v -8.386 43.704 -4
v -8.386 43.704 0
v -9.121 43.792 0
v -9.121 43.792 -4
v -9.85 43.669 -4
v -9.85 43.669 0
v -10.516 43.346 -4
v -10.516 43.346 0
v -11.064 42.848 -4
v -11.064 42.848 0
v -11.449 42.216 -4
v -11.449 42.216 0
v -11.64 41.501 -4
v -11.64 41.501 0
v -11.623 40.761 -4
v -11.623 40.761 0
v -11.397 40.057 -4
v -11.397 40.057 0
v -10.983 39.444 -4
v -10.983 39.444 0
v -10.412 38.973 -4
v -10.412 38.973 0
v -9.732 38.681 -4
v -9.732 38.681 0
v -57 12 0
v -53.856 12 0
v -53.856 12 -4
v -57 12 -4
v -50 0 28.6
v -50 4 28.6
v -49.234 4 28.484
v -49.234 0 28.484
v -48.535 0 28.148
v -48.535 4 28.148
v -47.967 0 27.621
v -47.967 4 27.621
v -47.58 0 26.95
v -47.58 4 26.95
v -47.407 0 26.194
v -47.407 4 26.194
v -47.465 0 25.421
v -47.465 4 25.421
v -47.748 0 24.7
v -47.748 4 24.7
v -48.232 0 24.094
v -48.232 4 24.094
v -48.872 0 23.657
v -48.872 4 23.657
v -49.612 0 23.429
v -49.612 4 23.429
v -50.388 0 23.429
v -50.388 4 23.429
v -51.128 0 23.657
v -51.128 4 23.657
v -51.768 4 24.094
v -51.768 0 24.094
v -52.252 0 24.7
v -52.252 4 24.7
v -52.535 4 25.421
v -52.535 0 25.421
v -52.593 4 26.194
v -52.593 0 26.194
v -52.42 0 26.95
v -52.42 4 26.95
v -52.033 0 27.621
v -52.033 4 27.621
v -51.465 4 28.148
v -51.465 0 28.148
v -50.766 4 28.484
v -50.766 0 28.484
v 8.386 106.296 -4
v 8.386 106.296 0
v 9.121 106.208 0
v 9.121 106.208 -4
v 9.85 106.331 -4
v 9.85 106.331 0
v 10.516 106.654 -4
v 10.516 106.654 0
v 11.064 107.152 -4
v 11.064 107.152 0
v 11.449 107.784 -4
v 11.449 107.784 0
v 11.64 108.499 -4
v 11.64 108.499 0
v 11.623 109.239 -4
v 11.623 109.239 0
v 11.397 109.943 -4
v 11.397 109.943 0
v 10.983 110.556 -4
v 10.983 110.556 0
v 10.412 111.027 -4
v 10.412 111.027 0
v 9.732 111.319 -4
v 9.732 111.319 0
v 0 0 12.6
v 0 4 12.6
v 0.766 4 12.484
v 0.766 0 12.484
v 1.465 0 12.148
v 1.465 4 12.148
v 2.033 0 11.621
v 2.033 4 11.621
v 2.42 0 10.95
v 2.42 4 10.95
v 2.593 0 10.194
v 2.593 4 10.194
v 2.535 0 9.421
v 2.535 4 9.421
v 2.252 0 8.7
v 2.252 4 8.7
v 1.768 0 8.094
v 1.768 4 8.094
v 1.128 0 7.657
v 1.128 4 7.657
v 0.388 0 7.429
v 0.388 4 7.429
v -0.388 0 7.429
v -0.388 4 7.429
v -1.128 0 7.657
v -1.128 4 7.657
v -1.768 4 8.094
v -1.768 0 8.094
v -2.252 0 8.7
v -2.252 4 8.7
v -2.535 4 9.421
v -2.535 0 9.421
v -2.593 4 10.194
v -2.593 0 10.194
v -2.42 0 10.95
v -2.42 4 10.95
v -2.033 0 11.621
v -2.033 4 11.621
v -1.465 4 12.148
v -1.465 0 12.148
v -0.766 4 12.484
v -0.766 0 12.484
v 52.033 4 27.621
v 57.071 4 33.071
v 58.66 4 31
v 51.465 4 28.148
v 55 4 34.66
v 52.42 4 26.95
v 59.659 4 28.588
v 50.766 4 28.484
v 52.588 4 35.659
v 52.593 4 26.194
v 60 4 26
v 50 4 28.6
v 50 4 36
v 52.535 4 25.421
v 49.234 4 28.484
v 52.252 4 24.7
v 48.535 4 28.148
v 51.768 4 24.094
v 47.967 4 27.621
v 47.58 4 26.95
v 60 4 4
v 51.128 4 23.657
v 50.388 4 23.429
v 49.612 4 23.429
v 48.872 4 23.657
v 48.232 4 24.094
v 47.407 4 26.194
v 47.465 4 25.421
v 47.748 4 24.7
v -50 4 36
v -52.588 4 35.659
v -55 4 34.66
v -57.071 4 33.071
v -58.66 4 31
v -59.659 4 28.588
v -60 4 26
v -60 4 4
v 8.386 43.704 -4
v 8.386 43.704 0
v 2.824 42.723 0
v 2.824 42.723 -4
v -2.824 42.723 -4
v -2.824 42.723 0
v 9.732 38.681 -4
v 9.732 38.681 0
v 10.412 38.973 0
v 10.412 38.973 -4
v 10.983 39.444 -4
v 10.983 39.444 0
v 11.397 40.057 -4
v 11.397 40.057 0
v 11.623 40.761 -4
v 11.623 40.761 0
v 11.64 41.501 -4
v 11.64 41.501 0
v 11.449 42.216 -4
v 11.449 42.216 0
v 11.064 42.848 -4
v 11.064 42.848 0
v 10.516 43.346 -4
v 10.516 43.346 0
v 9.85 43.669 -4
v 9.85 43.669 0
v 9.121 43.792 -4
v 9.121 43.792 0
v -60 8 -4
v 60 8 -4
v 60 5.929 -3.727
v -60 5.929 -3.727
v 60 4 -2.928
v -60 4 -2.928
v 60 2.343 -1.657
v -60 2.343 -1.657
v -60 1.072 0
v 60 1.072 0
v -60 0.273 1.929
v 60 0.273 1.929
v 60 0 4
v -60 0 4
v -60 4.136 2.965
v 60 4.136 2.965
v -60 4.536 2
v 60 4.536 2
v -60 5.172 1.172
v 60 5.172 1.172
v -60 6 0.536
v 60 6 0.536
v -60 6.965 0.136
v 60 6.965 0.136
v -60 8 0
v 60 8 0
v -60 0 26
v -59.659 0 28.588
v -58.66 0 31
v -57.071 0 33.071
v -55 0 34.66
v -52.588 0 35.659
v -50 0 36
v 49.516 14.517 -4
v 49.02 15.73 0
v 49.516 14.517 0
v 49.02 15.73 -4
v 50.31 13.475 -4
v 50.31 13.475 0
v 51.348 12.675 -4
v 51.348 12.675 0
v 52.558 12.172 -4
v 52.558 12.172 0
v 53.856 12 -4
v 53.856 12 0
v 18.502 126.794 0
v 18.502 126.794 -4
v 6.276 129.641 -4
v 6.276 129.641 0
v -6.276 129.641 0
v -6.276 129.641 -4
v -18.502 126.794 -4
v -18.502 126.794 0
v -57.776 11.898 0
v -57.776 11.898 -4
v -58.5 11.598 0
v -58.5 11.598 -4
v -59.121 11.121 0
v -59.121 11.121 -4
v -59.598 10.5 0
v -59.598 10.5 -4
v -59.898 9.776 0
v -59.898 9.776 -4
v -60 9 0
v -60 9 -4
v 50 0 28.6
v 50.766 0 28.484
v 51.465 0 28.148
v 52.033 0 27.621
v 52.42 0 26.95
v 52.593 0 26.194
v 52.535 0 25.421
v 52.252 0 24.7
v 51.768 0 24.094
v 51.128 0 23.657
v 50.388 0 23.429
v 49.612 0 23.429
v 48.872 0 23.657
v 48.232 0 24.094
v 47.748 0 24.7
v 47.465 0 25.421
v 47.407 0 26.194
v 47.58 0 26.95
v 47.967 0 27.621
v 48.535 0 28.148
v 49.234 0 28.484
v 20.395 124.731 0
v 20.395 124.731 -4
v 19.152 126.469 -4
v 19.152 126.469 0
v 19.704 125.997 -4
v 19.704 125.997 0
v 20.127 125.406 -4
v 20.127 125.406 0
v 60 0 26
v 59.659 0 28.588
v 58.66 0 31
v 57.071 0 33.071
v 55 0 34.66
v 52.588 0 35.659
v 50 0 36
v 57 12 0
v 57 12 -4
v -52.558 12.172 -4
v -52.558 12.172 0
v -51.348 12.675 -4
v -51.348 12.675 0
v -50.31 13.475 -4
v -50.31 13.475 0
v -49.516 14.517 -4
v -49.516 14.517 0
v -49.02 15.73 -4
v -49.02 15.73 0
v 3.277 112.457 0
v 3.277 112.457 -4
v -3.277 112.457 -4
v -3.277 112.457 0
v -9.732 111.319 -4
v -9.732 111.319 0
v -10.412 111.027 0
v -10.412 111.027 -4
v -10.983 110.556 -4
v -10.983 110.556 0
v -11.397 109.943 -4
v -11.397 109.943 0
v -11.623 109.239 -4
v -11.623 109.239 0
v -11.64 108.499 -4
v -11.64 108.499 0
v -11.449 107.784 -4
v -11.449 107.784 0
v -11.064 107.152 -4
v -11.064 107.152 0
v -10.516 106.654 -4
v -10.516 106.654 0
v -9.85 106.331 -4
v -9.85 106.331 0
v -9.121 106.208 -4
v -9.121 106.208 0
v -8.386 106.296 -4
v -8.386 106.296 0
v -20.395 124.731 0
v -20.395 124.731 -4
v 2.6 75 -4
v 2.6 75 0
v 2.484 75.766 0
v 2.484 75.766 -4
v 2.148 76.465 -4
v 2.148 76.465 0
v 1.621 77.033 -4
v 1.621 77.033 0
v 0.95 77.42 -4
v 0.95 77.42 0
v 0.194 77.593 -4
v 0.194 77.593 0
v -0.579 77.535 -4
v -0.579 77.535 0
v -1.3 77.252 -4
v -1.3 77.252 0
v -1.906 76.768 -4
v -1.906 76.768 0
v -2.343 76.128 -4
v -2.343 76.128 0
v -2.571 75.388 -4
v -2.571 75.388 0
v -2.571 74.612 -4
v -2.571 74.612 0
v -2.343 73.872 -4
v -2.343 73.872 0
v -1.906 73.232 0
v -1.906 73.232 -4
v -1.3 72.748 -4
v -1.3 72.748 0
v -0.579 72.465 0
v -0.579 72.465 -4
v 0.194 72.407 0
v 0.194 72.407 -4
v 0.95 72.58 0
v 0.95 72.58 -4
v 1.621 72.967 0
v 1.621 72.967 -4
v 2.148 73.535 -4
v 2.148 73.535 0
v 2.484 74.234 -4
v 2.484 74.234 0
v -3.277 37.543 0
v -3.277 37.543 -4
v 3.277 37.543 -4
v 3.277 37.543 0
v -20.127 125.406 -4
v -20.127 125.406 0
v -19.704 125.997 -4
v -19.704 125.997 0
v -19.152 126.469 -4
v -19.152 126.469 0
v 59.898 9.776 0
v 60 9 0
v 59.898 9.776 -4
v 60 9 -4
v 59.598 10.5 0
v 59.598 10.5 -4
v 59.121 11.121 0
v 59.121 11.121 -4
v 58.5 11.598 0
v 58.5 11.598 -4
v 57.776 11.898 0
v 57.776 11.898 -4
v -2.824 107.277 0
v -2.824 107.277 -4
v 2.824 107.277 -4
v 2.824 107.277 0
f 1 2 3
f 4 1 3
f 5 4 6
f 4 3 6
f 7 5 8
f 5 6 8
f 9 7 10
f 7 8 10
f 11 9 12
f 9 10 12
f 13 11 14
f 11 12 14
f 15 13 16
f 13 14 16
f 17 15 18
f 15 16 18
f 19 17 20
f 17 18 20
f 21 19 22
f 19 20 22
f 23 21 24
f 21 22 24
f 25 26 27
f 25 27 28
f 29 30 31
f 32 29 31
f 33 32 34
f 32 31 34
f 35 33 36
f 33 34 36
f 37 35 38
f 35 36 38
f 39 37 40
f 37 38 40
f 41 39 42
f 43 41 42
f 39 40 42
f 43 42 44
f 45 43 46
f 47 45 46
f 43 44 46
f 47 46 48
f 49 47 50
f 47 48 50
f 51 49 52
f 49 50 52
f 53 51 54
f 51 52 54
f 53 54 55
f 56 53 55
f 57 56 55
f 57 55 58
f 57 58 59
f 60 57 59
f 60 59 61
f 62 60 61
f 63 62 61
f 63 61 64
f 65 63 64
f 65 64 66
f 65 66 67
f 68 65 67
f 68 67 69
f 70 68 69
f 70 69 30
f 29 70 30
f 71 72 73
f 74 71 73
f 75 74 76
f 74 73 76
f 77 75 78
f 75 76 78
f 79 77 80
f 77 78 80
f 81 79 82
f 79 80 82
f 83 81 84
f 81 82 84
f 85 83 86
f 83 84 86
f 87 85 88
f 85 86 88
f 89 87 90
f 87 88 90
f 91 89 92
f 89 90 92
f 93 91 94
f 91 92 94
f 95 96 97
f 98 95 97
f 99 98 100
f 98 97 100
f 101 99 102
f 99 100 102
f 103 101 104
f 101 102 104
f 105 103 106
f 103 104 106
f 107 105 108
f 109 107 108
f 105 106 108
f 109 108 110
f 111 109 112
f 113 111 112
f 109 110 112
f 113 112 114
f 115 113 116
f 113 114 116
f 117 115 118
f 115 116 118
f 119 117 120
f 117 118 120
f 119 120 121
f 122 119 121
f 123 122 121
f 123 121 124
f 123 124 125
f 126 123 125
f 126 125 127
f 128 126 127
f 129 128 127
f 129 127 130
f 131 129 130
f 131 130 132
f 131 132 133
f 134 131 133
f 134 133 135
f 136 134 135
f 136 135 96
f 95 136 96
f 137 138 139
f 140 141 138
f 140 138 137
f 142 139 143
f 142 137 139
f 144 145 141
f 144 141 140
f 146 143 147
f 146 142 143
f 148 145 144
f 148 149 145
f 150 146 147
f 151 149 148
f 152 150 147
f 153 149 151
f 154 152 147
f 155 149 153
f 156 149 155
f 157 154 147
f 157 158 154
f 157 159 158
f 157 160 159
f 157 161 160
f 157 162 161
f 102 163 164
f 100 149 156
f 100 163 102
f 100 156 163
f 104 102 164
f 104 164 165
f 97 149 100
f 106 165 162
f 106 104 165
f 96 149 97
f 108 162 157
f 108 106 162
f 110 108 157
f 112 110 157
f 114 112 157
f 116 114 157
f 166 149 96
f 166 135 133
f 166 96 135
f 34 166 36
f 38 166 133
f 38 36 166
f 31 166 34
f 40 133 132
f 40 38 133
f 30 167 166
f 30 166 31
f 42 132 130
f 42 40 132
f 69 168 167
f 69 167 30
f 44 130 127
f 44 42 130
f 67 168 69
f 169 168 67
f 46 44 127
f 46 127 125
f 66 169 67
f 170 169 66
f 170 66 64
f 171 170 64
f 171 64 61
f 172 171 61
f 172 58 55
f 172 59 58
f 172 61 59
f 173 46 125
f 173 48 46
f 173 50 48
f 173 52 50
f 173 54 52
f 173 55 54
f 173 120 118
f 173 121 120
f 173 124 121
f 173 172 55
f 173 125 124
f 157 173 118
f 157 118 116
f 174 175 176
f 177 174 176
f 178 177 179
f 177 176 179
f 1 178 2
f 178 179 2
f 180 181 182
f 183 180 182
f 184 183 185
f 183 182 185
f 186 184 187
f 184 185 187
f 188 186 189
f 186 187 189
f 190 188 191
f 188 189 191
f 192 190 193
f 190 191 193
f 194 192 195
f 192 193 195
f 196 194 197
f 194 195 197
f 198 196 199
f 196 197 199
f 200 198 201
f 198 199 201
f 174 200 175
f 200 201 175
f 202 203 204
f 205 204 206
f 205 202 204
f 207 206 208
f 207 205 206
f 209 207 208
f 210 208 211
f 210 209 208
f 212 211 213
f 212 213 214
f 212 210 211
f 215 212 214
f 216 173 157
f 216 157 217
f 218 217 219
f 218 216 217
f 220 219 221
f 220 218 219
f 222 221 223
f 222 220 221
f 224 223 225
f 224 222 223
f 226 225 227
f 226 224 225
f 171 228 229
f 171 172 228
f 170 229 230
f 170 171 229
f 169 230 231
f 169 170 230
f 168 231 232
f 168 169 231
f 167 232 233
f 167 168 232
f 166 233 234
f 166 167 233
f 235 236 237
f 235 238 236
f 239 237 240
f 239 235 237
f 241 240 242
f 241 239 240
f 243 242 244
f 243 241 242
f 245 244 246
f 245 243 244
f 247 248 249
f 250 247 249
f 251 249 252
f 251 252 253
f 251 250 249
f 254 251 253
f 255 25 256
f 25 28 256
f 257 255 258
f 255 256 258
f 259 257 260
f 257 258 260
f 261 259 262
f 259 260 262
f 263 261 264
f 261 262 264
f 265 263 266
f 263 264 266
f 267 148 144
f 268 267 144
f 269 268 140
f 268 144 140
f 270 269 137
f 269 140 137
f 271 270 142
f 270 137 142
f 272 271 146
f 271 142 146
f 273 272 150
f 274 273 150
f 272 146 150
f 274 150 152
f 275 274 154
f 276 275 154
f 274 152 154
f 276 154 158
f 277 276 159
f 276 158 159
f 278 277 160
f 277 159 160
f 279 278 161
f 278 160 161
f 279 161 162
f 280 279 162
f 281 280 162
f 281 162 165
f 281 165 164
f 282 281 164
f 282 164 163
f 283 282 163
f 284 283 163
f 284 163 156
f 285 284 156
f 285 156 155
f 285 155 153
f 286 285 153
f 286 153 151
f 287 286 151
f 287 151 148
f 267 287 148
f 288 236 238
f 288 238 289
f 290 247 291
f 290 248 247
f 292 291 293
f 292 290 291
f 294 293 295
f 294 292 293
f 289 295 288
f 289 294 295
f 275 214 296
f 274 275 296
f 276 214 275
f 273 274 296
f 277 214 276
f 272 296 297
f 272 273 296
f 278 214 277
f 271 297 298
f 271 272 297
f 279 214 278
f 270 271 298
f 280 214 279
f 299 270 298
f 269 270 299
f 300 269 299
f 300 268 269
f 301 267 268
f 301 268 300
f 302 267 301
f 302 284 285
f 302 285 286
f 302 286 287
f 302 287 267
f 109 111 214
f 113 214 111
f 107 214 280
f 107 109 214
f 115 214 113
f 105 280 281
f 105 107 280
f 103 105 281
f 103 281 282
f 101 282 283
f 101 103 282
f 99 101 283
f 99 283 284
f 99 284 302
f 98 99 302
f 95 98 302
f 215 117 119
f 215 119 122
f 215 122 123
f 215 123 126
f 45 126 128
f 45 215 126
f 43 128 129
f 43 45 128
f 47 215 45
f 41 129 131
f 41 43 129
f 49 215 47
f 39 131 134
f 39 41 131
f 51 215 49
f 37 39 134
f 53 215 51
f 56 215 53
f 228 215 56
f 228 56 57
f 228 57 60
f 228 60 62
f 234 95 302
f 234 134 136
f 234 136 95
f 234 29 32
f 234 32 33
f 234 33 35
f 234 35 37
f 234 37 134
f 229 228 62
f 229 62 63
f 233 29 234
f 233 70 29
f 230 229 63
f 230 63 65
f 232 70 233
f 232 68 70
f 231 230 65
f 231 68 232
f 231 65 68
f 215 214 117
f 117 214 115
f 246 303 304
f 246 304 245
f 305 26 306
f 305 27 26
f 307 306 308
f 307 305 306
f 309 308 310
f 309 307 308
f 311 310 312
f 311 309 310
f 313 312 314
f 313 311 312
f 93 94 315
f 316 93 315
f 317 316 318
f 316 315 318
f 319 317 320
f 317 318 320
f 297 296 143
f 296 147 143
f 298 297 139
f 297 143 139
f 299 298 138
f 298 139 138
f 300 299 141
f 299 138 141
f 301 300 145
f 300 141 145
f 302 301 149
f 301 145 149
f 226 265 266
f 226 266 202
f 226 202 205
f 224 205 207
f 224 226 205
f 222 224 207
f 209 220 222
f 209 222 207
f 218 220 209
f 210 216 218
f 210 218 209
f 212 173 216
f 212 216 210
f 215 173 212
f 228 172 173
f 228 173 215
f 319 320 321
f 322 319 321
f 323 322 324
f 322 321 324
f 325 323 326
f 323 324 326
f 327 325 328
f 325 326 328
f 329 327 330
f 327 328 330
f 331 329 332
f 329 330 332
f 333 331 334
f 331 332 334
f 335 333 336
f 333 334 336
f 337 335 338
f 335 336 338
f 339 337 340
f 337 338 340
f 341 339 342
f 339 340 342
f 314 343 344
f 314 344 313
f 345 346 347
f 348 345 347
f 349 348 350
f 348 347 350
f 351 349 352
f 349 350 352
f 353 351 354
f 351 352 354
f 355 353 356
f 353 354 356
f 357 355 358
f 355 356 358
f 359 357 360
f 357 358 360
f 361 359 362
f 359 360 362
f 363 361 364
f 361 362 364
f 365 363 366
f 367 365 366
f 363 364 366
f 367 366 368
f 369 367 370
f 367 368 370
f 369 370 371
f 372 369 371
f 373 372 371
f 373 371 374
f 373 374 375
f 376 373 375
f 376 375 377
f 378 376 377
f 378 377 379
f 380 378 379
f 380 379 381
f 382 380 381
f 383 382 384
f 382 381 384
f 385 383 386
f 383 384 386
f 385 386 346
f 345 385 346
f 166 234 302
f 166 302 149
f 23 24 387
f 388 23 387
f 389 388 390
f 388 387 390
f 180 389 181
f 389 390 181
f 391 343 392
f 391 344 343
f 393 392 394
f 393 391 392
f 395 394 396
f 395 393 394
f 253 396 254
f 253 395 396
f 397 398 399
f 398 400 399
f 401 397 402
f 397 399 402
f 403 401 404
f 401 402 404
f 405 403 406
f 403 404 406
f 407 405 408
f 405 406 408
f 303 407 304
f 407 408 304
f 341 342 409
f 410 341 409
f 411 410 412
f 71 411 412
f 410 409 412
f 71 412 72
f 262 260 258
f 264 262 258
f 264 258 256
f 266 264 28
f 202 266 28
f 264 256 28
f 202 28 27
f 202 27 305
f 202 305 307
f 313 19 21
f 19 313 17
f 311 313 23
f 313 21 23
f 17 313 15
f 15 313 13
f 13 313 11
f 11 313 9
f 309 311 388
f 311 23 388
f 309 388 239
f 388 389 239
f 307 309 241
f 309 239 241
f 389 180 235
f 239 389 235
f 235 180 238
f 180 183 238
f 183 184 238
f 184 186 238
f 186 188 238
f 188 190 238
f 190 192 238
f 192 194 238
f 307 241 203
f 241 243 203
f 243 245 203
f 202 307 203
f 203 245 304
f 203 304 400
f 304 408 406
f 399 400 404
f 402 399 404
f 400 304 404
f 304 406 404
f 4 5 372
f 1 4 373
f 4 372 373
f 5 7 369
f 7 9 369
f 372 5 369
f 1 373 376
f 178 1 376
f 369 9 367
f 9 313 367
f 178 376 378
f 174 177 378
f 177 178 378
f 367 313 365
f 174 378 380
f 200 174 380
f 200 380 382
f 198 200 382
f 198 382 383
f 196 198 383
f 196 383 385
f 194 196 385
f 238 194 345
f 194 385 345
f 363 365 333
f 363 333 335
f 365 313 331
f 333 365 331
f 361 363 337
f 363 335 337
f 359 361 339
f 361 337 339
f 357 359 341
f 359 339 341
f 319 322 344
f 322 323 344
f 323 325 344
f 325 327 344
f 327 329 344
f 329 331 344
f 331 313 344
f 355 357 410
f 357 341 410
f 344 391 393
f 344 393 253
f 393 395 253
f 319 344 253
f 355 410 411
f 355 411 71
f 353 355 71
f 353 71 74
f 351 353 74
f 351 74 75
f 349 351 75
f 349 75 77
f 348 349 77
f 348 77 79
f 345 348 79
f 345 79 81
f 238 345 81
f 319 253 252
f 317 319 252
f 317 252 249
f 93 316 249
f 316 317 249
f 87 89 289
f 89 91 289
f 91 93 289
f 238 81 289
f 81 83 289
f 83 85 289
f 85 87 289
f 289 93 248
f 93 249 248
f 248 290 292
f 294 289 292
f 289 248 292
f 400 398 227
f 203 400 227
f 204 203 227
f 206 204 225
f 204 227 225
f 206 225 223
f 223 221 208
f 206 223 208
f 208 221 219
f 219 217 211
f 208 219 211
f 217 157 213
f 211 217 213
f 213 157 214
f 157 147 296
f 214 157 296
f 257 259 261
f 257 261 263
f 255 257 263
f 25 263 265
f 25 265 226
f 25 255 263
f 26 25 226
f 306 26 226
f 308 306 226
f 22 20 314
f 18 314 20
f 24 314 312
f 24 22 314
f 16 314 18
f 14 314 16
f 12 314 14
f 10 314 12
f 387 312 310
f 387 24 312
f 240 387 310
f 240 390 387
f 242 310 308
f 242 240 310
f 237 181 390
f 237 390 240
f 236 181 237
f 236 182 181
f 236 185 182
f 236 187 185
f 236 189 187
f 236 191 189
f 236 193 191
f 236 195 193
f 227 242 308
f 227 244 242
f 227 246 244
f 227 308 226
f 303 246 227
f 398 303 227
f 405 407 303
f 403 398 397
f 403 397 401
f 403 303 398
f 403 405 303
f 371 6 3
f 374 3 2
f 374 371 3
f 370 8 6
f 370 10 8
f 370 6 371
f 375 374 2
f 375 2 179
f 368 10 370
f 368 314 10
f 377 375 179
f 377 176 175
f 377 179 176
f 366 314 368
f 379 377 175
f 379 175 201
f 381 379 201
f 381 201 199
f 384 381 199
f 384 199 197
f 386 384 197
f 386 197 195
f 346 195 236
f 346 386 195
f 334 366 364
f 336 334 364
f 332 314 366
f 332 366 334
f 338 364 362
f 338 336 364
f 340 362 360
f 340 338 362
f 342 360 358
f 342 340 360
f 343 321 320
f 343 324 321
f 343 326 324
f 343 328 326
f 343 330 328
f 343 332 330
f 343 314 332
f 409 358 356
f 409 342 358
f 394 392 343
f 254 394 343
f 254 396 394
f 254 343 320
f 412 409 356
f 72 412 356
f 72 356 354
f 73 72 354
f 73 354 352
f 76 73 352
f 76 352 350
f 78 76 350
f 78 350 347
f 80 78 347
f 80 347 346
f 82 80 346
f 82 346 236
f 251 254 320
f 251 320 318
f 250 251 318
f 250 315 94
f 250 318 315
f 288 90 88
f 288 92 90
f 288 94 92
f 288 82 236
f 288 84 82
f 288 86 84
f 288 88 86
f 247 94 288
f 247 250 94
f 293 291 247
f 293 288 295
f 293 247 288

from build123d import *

# Parameters (mm, degrees)
SKETCH_13_R                      = 2.6
SM_BASE_FLANGE_2_DEPTH           = 4
SM_EDGE_FLANGE_2_STRIP_W         = 24
SM_EDGE_FLANGE_2_STRIP_H         = 4
SM_EDGE_FLANGE_2_STRIP_CUT_DEPTH = 120
SM_EDGE_FLANGE_2_DEPTH           = 120
FILLET_1_R                       = 5
FILLET_2_R                       = 3
FILLET_3_R                       = 10
SKETCH_23_R                      = 2.6
CUT_EXTRUDE_2_DEPTH              = 10


# Sheet-metal steps are written as plain solids
with BuildPart() as part:
    # Эскиз13 → Базовая кромка2 (new body)
    with BuildSketch(Plane.XY):
        with BuildLine():
            Line((-60, 0), (60, 0))
            Line((60, 0), (60, 12))
            Line((60, 12), (50, 12))
            Line((50, 12), (20, 126.23475383))
            ThreePointArc((20, 126.23475383), (0, 130), (-20, 126.23475383))
            Line((-20, 126.23475383), (-50, 12))
            Line((-50, 12), (-60, 12))
            Line((-60, 12), (-60, 0))
        make_face()
        with Locations((0, 75)):
            Circle(SKETCH_13_R, mode=Mode.SUBTRACT)
        with BuildLine():
            ThreePointArc((9.731596096, 111.318811068), (0, 112.6), (-9.731596096, 111.318811068))
            ThreePointArc((-9.731596096, 111.318811068), (-11.570073727, 108.134474403), (-8.385737061, 106.295996772))
            ThreePointArc((-8.385737061, 106.295996772), (0, 107.4), (8.385737061, 106.295996772))
            ThreePointArc((8.385737061, 106.295996772), (11.570073727, 108.134474403), (9.731596096, 111.318811068))
        make_face(mode=Mode.SUBTRACT)
        with BuildLine():
            ThreePointArc((-9.731596096, 38.681188932), (0, 37.4), (9.731596096, 38.681188932))
            ThreePointArc((9.731596096, 38.681188932), (11.570073727, 41.865525597), (8.385737061, 43.704003228))
            ThreePointArc((8.385737061, 43.704003228), (0, 42.6), (-8.385737061, 43.704003228))
            ThreePointArc((-8.385737061, 43.704003228), (-11.570073727, 41.865525597), (-9.731596096, 38.681188932))
        make_face(mode=Mode.SUBTRACT)
    extrude(amount=-SM_BASE_FLANGE_2_DEPTH)

    # Ребро-кромка2 strip (across the edge) → Ребро-кромка2 strip cut (cut)
    with BuildSketch(Plane.YZ.offset(-60)):
        with Locations((-4, -2)):
            Rectangle(SM_EDGE_FLANGE_2_STRIP_W, SM_EDGE_FLANGE_2_STRIP_H)
    extrude(amount=SM_EDGE_FLANGE_2_STRIP_CUT_DEPTH, mode=Mode.SUBTRACT)

    # Ребро-кромка2 section (across the edge) → Ребро-кромка2 (add)
    with BuildSketch(Plane.YZ.offset(-60)):
        with BuildLine():
            Line((0, 4), (0, 36))
            Line((0, 36), (4, 36))
            Line((4, 36), (4, 4))
            ThreePointArc((4, 4), (5.171572875, 1.171572875), (8, 0))
            Line((8, 0), (8, -4))
            ThreePointArc((8, -4), (2.343145751, -1.656854249), (0, 4))
        make_face()
    extrude(amount=SM_EDGE_FLANGE_2_DEPTH)

    # Скругление1
    fillet_1_edges = [part.edges().sort_by_distance(p)[0] for p in [
        (-50, 12, -2),
        (50, 12, -2),
    ]]
    fillet(fillet_1_edges, radius=FILLET_1_R)

    # Скругление2
    fillet_2_edges = [part.edges().sort_by_distance(p)[0] for p in [
        (-60, 12, -2),
        (-20, 126.23475383, -2),
        (20, 126.23475383, -2),
        (60, 12, -2),
    ]]
    fillet(fillet_2_edges, radius=FILLET_2_R)

    # Скругление3
    fillet_3_edges = [part.edges().sort_by_distance(p)[0] for p in [
        (-60, 2, 36),
        (60, 2, 36),
    ]]
    fillet(fillet_3_edges, radius=FILLET_3_R)

    # Эскиз23 → Вырез-Вытянуть2 (cut)
    with BuildSketch(Plane(origin=(0, 4, 0), x_dir=(1, 0, 0), z_dir=(0, 1, 0))):
        with Locations(Location((-50, -26, 0), (0, 0, 270))):
            Circle(SKETCH_23_R)
        with Locations(Location((50, -26, 0), (0, 0, 270))):
            Circle(SKETCH_23_R)
        with Locations(Location((0, -10, 0), (0, 0, 270))):
            Circle(SKETCH_23_R)
    extrude(amount=-CUT_EXTRUDE_2_DEPTH, mode=Mode.SUBTRACT)


solid = part.part
